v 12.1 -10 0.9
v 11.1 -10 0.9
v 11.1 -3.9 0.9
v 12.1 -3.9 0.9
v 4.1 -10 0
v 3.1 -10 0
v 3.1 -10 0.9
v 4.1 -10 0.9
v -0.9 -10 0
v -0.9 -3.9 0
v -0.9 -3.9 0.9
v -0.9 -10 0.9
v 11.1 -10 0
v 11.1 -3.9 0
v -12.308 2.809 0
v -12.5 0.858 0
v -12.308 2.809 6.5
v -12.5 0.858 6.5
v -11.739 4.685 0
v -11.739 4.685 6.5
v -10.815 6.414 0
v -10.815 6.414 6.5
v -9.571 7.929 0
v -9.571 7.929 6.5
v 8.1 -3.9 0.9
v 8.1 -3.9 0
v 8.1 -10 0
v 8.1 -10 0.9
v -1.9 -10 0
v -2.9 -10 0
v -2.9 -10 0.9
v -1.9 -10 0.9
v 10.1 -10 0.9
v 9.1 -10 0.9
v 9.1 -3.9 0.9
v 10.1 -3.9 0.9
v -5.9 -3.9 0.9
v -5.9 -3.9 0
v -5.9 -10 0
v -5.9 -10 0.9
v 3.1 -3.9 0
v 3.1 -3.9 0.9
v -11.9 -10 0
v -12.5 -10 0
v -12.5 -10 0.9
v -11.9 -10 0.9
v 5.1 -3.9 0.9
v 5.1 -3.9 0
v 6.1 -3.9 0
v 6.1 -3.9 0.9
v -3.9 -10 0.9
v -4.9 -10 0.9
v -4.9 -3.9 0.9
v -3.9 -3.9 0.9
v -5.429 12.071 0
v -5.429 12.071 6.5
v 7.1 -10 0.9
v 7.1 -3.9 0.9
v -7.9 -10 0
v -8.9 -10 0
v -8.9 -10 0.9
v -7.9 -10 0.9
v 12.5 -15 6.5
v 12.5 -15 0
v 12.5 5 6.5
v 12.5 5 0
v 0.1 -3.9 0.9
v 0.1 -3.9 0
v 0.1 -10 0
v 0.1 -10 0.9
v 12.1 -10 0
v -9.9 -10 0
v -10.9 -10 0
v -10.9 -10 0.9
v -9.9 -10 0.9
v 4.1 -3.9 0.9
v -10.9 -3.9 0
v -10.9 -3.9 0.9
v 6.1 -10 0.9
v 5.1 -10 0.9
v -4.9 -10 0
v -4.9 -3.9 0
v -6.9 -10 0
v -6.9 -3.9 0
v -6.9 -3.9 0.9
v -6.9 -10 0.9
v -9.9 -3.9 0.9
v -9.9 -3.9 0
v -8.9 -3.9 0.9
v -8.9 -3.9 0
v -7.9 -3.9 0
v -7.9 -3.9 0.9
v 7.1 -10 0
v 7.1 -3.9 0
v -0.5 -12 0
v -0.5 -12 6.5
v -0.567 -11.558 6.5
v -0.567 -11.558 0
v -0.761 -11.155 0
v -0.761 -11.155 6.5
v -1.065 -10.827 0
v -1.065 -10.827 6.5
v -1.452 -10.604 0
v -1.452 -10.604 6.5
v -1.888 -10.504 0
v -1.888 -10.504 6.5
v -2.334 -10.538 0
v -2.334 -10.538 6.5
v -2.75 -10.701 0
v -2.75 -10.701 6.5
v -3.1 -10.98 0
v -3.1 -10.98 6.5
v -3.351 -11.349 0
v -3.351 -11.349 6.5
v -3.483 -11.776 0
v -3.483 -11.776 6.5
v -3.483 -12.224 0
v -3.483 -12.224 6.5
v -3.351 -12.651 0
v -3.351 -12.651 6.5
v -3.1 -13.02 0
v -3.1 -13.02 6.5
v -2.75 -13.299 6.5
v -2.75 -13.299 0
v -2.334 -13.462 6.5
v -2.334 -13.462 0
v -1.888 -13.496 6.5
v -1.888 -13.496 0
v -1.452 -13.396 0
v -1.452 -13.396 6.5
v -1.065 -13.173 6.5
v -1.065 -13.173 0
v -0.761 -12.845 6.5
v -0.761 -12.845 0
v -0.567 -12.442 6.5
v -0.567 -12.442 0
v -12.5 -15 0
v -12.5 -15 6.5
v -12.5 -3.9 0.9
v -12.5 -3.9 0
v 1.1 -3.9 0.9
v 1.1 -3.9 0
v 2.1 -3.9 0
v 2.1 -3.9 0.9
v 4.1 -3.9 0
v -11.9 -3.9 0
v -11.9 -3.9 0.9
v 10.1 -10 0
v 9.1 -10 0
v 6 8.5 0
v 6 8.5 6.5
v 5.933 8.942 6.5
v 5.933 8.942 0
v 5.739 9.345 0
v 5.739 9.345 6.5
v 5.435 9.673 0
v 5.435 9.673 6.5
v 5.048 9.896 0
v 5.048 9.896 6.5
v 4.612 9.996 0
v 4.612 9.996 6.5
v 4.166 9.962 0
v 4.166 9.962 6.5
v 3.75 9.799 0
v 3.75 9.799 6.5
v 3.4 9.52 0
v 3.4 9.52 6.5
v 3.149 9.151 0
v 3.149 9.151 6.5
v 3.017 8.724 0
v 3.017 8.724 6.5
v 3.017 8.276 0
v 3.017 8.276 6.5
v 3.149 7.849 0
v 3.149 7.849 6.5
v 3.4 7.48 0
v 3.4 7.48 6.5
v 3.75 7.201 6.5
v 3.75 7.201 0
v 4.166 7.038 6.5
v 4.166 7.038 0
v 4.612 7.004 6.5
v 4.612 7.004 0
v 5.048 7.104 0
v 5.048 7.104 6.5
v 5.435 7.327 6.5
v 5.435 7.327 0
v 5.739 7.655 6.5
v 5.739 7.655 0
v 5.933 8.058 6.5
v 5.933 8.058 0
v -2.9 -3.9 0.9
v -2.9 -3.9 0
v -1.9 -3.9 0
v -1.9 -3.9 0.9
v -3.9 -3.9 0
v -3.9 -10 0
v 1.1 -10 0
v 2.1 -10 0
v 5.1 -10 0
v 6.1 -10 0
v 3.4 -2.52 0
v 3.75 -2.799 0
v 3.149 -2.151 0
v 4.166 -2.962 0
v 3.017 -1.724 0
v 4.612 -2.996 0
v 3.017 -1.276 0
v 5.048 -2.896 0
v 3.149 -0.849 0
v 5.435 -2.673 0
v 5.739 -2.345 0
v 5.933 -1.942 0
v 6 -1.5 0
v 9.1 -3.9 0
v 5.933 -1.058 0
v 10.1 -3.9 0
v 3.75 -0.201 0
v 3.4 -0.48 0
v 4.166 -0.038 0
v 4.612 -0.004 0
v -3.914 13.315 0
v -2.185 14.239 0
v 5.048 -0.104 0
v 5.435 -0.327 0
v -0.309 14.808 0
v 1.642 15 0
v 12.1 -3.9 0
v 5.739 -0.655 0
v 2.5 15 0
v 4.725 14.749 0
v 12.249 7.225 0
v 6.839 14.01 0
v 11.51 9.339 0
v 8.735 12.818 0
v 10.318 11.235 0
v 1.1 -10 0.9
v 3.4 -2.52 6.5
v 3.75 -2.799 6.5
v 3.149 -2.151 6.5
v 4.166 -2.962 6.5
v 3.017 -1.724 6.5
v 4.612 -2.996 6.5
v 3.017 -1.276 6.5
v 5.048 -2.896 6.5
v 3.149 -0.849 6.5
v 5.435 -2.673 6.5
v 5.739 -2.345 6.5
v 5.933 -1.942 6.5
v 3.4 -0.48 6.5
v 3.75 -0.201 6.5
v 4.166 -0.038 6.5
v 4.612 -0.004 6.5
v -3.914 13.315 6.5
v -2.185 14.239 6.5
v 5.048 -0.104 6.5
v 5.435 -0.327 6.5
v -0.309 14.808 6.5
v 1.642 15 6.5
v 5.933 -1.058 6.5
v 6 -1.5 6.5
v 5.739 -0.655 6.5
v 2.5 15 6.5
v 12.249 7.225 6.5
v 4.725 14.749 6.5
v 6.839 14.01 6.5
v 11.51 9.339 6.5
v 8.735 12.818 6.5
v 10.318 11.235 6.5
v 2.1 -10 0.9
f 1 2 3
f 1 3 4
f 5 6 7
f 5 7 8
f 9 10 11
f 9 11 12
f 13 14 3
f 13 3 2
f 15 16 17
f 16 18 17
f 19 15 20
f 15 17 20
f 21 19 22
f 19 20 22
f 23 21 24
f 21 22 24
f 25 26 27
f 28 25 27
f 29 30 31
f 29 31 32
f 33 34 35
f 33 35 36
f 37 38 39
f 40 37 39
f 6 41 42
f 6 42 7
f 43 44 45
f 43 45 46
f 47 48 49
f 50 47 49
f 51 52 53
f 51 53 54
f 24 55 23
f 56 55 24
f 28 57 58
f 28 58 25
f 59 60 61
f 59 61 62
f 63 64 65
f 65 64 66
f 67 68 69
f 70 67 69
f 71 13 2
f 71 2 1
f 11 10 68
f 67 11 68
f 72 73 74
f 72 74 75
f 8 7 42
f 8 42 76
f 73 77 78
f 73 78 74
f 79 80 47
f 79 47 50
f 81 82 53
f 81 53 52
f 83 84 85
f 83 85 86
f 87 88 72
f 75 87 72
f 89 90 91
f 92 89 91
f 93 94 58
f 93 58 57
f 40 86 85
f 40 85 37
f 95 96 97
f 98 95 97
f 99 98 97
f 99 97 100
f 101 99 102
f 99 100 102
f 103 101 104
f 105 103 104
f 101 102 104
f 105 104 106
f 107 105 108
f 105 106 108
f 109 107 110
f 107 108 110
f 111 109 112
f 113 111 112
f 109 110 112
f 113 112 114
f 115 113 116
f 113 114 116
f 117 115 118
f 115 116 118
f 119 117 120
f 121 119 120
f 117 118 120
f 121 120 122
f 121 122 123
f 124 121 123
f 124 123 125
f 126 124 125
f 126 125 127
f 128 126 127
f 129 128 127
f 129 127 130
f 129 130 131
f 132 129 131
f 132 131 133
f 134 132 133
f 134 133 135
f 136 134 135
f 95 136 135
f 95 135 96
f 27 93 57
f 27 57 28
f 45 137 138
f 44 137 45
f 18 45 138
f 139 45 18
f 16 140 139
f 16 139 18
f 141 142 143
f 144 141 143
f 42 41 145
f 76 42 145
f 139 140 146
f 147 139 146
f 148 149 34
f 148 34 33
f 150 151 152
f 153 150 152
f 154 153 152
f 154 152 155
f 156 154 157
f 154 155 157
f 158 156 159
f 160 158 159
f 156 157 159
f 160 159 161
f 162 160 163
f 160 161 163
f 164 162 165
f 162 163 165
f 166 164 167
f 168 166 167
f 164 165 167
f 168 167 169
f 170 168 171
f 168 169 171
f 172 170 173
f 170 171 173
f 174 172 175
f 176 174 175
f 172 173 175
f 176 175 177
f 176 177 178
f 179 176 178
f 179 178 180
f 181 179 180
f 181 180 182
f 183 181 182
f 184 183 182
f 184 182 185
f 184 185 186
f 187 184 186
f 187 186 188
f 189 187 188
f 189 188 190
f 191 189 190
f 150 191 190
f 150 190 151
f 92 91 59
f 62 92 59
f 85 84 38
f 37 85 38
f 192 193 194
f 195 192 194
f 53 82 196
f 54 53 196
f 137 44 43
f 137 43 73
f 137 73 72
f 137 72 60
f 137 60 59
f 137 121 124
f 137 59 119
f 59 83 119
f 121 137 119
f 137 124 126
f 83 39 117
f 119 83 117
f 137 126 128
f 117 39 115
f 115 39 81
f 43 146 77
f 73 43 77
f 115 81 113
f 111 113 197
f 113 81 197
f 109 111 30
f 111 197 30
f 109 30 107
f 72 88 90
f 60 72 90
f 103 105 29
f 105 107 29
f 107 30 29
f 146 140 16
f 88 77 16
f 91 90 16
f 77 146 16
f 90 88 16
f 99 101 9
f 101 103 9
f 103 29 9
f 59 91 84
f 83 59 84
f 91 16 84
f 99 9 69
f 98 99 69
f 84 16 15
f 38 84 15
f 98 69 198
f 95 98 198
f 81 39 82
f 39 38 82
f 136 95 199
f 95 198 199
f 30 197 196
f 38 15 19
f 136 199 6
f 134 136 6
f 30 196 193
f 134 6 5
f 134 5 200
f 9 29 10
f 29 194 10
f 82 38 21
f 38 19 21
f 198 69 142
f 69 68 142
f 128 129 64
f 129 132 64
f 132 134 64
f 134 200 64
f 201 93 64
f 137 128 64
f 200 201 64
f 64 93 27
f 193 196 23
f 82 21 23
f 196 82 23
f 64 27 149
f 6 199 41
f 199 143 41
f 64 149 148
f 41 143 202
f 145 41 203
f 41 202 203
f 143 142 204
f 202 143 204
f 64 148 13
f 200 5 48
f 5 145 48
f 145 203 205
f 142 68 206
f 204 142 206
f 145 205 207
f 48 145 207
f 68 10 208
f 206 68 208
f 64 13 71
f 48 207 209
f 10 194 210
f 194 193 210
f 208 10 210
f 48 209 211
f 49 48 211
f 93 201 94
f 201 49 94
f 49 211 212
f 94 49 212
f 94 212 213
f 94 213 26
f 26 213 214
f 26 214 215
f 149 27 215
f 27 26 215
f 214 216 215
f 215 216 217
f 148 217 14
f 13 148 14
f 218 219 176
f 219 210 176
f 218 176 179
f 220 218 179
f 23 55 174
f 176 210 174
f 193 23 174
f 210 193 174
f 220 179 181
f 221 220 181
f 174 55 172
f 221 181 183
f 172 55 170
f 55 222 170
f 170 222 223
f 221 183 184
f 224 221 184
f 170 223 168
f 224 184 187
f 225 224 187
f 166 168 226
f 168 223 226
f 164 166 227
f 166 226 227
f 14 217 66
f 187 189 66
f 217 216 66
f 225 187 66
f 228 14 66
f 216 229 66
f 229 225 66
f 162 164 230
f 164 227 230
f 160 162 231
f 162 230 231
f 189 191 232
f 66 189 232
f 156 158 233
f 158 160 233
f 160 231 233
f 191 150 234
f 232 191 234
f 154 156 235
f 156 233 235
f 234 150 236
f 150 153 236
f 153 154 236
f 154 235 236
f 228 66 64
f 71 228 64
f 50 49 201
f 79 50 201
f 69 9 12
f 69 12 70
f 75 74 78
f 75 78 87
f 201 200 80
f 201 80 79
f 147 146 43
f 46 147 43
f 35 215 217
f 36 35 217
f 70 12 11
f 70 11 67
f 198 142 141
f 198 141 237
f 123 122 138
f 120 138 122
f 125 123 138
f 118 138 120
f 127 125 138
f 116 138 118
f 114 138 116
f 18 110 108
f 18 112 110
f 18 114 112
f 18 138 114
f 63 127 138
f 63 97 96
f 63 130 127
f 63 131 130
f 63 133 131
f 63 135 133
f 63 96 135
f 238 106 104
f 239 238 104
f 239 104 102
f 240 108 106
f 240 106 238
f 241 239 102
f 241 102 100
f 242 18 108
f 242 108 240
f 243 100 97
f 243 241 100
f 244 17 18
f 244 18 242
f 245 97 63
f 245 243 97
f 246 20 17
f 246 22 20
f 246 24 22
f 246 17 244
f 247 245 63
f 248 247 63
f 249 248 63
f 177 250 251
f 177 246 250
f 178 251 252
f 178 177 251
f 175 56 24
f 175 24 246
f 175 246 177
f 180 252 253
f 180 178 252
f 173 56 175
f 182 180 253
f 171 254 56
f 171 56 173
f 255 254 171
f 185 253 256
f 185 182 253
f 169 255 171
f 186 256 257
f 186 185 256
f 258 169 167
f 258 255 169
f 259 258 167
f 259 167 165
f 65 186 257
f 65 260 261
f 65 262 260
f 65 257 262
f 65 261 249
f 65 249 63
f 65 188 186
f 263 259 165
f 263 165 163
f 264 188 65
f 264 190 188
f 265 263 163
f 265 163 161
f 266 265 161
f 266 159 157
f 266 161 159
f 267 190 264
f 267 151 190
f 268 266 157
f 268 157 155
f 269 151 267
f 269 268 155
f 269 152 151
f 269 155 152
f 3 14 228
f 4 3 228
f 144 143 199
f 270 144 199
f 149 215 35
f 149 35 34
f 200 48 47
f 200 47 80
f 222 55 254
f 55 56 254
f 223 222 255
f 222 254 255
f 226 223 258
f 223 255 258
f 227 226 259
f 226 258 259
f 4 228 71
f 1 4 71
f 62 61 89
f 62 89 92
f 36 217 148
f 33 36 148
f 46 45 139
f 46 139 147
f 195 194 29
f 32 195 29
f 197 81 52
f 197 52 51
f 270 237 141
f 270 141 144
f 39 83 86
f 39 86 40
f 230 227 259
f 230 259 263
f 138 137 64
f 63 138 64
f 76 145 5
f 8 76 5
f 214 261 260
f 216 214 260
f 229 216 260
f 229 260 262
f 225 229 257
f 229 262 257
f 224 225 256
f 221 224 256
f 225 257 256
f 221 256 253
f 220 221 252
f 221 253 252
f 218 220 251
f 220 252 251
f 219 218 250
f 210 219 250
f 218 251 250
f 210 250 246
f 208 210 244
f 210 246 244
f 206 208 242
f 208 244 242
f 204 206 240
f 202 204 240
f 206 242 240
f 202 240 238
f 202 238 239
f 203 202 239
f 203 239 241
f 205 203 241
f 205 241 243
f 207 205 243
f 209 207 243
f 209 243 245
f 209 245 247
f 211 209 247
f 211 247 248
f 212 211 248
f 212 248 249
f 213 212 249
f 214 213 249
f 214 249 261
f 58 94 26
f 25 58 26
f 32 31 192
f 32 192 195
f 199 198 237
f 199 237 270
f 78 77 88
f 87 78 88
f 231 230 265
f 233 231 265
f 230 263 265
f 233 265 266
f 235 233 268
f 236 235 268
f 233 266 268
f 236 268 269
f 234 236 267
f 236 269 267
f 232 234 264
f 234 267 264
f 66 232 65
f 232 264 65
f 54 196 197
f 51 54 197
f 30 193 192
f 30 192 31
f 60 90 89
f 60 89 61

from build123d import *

# Parameters (mm, degrees)
F0_W     = 25
F0_H     = 30
F1_DEPTH = 6.5
F2_R     = 1.5
F3_DEPTH = 6.501
F4_W     = 1
F4_H     = 6.1
F5_DEPTH = 0.9
F6_SIZE  = 10
F7_R     = 10


with BuildPart() as f1:
    # F0 (on Top) → F1 (new body)
    with BuildSketch(Plane.XY):
        Rectangle(F0_W, F0_H)
    extrude(amount=F1_DEPTH)

    # F2 (on face) → F3 (cut, through all)
    with BuildSketch(Plane.XY.offset(6.5)):
        with Locations((-2, -12)):
            Circle(F2_R)
        with Locations((4.5, -1.5)):
            Circle(F2_R)
        with Locations((4.5, 8.5)):
            Circle(F2_R)
    extrude(amount=-F3_DEPTH, mode=Mode.SUBTRACT)

    # F4 (on face) → F5 (cut)
    with BuildSketch(Plane(origin=(0, 0, 0), x_dir=(1, 0, 0), z_dir=(0, 0, -1))):
        with Locations((11.6, 6.95)):
            Rectangle(F4_W, F4_H)
        with Locations((9.6, 6.95)):
            Rectangle(F4_W, F4_H)
        with Locations((7.6, 6.95)):
            Rectangle(F4_W, F4_H)
        with Locations((5.6, 6.95)):
            Rectangle(F4_W, F4_H)
        with Locations((3.6, 6.95)):
            Rectangle(F4_W, F4_H)
        with Locations((1.6, 6.95)):
            Rectangle(F4_W, F4_H)
        with Locations((-0.4, 6.95)):
            Rectangle(F4_W, F4_H)
        with Locations((-2.4, 6.95)):
            Rectangle(F4_W, F4_H)
        with Locations((-4.4, 6.95)):
            Rectangle(F4_W, F4_H)
        with Locations((-6.4, 6.95)):
            Rectangle(F4_W, F4_H)
        with Locations((-8.4, 6.95)):
            Rectangle(F4_W, F4_H)
        with Locations((-10.4, 6.95)):
            Rectangle(F4_W, F4_H)
        with Locations((-12.4, 6.95)):
            Rectangle(F4_W, F4_H)
    extrude(amount=-F5_DEPTH, mode=Mode.SUBTRACT)

    # F6
    f6_edges = [f1.edges().sort_by_distance(p)[0] for p in [
        (-12.5, 15, 3.25),
    ]]
    chamfer(f6_edges, length=F6_SIZE)

    # F7
    f7_edges = [f1.edges().sort_by_distance(p)[0] for p in [
        (-12.5, 5, 3.25),
        (-2.5, 15, 3.25),
        (12.5, 15, 3.25),
    ]]
    fillet(f7_edges, radius=F7_R)


solid = f1.part
